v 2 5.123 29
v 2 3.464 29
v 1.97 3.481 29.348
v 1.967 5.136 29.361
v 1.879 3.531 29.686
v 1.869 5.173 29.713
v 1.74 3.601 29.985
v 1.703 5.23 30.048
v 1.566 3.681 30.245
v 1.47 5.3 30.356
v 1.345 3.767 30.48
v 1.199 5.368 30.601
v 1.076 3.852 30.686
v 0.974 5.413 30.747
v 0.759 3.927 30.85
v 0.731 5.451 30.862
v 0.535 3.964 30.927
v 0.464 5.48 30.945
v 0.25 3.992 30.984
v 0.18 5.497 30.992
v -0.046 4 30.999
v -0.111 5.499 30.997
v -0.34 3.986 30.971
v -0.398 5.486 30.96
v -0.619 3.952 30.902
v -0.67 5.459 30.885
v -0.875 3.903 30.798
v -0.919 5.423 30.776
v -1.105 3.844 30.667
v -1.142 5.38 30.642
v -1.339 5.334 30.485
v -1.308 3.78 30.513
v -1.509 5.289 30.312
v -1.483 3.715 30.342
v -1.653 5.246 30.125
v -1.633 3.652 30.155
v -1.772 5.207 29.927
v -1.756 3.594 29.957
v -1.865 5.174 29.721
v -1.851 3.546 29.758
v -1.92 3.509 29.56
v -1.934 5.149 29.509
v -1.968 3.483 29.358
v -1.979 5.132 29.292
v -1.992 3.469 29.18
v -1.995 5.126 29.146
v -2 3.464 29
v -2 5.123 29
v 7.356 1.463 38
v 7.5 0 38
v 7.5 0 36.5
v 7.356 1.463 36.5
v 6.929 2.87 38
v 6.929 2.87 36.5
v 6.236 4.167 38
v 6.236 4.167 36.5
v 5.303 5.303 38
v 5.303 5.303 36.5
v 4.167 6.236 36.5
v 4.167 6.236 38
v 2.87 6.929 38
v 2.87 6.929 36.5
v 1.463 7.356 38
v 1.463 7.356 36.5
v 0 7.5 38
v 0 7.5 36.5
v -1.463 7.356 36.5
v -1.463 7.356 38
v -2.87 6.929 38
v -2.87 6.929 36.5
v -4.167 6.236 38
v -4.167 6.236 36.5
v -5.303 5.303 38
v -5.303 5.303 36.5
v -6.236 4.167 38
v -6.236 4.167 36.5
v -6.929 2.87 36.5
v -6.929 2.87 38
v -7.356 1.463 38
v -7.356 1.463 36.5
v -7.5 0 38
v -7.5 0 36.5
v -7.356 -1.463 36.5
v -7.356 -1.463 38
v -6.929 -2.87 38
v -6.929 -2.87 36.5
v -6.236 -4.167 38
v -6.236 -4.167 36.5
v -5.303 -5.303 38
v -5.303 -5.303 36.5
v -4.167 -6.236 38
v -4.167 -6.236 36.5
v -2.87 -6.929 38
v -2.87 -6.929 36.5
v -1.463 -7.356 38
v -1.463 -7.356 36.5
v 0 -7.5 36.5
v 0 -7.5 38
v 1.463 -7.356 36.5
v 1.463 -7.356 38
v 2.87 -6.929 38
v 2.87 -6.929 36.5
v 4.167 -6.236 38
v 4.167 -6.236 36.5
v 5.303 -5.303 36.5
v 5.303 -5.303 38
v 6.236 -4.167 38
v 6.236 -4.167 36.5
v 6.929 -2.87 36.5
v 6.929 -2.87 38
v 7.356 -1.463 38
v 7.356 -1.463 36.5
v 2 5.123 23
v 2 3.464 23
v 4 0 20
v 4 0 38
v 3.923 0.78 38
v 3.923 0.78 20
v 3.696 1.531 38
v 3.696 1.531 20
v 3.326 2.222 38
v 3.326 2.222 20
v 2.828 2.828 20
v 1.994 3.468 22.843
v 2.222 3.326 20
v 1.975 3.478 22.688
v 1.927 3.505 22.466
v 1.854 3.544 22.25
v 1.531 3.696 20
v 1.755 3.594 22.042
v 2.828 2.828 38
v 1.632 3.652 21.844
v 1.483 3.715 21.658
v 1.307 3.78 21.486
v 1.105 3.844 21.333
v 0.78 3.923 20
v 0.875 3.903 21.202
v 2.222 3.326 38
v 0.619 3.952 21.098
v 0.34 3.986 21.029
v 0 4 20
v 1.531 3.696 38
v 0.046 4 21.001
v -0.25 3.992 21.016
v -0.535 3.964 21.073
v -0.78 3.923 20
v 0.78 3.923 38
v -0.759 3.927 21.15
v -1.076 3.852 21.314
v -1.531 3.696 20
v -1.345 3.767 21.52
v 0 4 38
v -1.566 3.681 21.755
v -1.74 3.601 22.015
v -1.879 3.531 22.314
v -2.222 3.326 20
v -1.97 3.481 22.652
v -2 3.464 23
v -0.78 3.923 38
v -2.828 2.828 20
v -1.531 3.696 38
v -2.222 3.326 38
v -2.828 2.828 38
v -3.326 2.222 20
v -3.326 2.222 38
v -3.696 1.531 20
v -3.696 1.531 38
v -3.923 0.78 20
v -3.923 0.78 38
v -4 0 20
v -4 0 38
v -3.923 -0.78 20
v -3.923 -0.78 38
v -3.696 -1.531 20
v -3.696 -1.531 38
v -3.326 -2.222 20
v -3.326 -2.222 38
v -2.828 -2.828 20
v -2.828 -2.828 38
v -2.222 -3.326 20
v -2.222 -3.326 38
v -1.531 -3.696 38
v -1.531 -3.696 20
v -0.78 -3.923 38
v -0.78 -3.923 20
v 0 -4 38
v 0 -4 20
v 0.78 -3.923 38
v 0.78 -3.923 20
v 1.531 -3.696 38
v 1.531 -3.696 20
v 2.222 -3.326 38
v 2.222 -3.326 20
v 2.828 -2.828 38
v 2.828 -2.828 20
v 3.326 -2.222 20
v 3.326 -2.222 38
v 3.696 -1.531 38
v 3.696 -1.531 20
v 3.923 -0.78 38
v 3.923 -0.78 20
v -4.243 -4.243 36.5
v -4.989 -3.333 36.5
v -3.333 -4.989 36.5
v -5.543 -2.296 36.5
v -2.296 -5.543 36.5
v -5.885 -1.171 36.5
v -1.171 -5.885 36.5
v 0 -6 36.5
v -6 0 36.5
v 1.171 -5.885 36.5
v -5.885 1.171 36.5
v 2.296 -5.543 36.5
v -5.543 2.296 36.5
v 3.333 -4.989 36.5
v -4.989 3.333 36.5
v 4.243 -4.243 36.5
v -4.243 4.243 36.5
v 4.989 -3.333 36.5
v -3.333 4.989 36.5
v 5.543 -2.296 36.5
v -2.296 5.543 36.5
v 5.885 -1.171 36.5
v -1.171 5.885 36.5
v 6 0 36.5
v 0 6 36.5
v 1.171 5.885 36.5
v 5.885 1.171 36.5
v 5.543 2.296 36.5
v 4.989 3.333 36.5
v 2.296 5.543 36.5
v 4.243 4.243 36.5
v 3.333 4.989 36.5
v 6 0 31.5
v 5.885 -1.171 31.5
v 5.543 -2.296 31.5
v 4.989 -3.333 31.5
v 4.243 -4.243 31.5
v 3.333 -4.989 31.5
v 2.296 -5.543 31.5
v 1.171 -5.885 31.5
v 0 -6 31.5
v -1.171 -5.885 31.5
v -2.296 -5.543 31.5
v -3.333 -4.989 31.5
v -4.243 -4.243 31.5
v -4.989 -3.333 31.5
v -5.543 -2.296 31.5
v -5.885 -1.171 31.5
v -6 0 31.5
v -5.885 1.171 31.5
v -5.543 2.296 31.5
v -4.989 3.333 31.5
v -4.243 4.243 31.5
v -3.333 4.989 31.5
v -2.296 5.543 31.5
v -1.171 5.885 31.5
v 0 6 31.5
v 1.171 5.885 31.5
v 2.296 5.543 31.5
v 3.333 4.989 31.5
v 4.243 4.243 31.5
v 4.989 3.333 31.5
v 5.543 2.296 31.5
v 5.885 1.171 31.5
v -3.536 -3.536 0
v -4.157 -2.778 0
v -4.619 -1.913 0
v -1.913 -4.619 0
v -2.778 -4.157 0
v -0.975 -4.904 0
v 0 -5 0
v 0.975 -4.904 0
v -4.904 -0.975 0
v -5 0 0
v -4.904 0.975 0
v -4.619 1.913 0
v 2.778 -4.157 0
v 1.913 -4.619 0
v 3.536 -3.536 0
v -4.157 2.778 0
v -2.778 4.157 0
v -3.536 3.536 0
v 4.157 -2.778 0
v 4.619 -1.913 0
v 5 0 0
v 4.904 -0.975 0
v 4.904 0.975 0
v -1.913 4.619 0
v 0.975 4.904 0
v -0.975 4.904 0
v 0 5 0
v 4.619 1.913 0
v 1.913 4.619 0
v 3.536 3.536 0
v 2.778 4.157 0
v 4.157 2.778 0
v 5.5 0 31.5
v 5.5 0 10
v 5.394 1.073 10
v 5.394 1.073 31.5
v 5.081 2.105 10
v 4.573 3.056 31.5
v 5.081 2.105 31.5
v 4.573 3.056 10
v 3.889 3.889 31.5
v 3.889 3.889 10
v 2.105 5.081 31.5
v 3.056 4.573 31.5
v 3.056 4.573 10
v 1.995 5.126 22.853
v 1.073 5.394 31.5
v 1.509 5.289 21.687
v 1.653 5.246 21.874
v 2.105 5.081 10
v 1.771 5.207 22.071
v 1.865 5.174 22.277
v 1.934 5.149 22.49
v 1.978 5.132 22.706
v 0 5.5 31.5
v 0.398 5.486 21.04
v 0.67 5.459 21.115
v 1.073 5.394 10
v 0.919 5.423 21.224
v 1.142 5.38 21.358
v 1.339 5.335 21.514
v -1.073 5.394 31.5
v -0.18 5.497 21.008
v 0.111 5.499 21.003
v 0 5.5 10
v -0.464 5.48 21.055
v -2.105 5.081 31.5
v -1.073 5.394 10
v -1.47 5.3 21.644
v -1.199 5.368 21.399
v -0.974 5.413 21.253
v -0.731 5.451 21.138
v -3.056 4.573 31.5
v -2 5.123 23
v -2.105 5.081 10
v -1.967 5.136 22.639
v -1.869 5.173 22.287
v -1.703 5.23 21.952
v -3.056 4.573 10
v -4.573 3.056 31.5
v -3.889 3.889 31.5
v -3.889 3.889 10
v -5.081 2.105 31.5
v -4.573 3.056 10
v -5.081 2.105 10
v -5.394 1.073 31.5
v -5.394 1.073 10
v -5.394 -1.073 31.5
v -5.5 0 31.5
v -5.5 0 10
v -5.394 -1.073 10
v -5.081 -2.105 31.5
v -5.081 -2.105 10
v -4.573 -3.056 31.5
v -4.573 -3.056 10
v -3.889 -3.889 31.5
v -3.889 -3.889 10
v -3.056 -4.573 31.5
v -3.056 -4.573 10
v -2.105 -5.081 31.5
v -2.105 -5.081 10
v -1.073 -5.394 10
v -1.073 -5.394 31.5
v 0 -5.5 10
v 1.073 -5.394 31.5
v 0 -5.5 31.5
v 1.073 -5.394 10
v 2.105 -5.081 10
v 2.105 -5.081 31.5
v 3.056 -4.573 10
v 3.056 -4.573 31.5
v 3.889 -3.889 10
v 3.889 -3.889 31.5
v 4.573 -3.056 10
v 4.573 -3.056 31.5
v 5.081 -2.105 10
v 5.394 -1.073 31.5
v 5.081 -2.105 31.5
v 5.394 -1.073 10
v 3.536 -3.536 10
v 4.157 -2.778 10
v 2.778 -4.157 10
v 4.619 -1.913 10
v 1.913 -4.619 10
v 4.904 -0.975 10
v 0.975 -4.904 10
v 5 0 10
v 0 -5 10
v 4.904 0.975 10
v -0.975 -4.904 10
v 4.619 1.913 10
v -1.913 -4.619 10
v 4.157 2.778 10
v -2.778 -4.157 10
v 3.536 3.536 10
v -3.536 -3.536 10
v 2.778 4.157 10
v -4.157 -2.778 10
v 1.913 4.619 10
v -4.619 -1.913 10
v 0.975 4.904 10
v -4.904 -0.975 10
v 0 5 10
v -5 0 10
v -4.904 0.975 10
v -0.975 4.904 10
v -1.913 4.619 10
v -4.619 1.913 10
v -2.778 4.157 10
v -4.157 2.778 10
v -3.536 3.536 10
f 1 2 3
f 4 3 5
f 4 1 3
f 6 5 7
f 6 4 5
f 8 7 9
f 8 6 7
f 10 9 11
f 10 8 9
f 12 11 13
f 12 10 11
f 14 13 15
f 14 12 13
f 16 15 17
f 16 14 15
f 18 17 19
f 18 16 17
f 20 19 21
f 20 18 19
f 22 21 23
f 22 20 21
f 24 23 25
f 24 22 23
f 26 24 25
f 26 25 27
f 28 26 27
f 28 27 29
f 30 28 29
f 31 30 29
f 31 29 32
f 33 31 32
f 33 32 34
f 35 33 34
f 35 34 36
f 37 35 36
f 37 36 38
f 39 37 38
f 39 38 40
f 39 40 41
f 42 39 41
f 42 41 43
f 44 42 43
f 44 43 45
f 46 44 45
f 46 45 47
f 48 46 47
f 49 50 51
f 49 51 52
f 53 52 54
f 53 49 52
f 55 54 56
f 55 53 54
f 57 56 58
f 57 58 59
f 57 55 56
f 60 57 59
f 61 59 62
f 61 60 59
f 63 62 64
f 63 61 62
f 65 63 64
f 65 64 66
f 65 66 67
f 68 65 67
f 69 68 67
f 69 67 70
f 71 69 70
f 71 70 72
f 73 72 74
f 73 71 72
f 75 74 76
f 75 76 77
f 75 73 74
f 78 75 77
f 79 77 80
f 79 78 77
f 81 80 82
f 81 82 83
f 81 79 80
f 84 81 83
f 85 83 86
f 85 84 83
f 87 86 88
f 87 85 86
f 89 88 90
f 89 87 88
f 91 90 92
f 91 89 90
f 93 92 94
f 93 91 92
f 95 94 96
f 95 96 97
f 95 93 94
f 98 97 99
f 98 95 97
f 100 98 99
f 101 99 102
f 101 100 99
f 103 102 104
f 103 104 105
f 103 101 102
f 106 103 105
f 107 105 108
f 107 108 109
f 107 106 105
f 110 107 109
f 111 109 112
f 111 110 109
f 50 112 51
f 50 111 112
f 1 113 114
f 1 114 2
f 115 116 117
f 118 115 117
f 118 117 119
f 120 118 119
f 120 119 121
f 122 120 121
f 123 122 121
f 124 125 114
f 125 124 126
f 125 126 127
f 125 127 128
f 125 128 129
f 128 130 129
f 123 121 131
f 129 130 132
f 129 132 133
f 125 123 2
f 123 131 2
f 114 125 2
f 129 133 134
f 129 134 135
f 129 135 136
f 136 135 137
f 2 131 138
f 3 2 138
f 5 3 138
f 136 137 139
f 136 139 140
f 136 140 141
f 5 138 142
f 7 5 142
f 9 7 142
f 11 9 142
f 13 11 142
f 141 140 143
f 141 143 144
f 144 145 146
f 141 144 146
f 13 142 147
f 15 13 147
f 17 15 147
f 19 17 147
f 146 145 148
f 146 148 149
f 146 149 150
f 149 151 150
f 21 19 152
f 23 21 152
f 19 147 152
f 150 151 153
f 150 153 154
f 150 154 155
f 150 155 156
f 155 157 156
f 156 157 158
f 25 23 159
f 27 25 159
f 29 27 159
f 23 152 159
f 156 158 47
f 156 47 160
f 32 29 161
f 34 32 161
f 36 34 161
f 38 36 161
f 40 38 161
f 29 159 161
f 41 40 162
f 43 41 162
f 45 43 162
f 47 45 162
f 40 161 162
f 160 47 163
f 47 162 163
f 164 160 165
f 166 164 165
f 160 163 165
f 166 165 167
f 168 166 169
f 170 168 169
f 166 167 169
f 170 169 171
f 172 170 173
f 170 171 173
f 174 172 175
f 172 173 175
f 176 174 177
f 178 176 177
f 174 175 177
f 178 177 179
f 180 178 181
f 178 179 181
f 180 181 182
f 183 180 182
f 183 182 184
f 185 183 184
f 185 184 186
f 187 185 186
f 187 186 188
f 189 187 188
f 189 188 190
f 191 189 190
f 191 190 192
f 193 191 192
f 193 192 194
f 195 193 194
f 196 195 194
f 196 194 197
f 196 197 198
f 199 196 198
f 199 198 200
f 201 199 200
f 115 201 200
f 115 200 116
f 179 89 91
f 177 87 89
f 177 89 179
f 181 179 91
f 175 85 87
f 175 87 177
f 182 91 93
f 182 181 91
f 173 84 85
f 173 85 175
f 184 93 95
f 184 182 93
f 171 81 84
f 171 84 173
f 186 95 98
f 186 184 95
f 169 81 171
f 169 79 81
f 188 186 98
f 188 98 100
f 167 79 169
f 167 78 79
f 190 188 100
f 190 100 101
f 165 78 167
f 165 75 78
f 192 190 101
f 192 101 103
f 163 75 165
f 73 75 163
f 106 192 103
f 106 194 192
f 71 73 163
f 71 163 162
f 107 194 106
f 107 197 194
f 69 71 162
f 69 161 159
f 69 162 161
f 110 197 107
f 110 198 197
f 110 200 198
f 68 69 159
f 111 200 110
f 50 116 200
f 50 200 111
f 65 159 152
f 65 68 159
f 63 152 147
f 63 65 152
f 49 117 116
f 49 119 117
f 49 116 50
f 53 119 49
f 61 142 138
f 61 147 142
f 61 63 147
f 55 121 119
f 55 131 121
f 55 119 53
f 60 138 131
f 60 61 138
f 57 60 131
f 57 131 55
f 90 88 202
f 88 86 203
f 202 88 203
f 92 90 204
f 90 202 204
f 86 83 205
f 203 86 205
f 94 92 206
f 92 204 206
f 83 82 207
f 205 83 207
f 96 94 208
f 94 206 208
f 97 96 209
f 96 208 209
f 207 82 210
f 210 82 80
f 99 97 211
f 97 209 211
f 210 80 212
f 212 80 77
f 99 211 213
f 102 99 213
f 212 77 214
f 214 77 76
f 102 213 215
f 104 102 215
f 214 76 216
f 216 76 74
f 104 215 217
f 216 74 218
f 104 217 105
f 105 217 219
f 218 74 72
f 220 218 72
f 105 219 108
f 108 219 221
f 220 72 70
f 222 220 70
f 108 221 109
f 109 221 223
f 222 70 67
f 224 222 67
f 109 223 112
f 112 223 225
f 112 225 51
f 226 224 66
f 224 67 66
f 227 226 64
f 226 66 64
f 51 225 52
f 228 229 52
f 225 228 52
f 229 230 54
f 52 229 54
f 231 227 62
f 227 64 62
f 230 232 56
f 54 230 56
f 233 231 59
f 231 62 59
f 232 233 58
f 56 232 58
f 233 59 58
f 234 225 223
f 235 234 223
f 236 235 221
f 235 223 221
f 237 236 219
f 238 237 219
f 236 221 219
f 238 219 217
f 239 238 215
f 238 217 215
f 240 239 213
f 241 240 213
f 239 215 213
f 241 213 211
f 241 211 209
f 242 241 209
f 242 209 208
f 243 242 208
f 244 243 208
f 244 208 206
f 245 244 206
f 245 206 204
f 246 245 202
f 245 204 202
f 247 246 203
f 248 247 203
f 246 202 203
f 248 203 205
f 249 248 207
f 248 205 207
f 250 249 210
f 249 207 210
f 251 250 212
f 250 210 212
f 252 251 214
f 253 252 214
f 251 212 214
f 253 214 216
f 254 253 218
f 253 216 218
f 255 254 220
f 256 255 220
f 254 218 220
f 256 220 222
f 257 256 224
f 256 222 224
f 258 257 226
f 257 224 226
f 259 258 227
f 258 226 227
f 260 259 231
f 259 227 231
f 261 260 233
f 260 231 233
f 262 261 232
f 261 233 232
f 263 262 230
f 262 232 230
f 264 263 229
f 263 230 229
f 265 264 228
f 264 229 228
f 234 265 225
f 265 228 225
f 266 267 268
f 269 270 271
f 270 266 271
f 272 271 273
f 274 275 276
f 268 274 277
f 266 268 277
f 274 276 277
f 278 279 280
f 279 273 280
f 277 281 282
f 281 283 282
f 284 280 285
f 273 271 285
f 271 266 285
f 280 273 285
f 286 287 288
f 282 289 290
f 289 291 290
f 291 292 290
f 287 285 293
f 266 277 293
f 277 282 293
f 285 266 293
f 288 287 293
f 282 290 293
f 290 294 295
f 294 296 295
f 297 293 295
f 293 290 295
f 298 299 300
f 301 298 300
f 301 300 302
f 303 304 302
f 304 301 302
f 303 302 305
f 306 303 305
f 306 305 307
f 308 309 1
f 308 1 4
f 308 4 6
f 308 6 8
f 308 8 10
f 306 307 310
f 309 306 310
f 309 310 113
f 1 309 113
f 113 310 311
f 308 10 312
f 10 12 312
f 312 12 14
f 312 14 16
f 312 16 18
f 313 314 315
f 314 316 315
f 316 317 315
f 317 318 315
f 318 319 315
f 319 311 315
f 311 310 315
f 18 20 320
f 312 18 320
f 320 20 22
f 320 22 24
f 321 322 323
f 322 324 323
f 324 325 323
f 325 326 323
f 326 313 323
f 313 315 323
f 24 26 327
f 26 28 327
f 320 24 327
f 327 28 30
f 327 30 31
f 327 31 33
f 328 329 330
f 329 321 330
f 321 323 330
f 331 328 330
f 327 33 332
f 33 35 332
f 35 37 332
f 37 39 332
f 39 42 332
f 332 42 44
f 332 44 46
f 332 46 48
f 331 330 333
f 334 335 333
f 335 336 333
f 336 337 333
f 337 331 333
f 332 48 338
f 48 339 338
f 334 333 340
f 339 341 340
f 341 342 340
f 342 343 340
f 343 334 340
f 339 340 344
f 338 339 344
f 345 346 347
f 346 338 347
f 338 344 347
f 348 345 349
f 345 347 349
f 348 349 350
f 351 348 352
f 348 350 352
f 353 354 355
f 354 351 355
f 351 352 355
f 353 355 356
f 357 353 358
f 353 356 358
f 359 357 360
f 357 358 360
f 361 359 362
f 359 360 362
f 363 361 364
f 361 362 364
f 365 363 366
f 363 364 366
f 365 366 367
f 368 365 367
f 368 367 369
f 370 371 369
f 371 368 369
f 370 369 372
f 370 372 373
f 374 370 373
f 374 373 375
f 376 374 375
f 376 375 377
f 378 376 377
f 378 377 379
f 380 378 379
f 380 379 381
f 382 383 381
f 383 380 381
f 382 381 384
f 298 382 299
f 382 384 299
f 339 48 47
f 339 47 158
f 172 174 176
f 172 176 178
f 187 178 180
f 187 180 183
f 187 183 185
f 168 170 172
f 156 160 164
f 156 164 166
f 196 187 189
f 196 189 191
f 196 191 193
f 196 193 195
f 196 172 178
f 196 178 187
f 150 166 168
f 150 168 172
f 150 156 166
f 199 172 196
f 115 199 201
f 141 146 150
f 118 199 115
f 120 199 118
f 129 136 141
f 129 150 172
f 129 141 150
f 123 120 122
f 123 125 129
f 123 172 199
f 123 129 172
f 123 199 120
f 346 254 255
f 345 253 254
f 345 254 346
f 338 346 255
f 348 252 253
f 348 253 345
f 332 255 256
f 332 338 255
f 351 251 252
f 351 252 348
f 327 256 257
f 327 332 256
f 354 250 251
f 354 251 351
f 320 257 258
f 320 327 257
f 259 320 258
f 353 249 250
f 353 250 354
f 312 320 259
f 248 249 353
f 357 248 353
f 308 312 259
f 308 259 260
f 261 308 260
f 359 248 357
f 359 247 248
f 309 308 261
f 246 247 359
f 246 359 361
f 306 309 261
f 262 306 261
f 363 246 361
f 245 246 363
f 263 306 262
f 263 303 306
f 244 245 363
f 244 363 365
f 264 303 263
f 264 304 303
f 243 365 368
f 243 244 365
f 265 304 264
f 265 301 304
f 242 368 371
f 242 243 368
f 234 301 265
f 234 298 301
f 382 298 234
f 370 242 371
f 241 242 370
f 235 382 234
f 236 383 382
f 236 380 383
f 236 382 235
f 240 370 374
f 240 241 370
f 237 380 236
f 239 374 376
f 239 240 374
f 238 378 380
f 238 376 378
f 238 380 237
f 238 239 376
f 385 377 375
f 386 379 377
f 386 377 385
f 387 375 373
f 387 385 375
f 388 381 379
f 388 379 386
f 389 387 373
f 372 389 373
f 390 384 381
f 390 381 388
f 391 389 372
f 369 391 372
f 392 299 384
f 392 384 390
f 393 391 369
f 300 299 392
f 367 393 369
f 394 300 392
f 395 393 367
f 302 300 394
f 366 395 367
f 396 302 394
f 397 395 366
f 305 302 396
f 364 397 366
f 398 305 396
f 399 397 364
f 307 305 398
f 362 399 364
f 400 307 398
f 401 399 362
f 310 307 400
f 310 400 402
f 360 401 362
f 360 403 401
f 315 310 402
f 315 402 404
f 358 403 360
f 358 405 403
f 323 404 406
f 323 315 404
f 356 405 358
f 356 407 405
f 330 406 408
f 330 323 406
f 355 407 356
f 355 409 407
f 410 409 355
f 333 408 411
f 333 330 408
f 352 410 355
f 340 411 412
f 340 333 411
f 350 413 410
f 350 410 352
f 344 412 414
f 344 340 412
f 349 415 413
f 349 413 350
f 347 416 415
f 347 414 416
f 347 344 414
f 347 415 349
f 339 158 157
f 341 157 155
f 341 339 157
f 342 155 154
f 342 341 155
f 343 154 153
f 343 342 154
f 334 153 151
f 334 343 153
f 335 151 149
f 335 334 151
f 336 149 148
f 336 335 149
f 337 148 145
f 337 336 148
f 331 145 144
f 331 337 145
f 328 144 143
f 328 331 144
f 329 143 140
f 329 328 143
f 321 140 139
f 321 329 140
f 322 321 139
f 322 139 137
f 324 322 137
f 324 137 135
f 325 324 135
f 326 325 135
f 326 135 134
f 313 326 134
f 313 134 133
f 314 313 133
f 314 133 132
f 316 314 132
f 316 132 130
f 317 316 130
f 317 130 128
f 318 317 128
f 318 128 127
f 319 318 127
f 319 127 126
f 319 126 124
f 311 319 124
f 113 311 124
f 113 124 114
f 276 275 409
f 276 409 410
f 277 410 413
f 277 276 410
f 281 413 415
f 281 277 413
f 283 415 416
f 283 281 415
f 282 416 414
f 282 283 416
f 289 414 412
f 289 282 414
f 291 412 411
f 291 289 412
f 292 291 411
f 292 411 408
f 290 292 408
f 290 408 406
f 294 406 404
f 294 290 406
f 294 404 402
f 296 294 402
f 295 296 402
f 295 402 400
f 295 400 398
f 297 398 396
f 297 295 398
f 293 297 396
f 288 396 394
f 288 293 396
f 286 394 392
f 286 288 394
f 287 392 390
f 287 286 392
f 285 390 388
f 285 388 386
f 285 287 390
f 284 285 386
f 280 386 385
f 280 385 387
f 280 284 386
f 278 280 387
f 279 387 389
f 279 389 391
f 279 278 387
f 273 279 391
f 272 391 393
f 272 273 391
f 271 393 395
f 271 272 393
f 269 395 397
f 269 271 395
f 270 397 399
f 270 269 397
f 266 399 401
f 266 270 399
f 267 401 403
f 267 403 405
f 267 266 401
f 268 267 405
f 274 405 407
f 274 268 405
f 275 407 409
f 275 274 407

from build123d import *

# Parameters (mm, degrees)
SKETCH1_R                    = 5.5
BOSS_EXTRUDE1_DEPTH          = 38
SKETCH8_R                    = 7.5
BOSS_EXTRUDE2_DEPTH          = 1.5
SKETCH9_R                    = 6
BOSS_EXTRUDE3_DEPTH          = 5
SKETCH2_R                    = 4
CUT_EXTRUDE1_DEPTH           = 18
KEYWAY_SLOT_DEPTH            = 2.5
SKETCH11_OUTSIDE_W           = 25.704
SKETCH11_OUTSIDE_H           = 25.704
SKETCH11_OUTSIDE_R           = 5
TRIM_FOR_M10_WHEEL_NUT_DEPTH = 10


with BuildPart() as part:
    # Sketch1 → Boss-Extrude1 (new body)
    with BuildSketch(Plane.XY):
        Circle(SKETCH1_R)
    extrude(amount=BOSS_EXTRUDE1_DEPTH)

    # Sketch8 → Boss-Extrude2 (add)
    with BuildSketch(Plane.XY.offset(38)):
        Circle(SKETCH8_R)
    extrude(amount=-BOSS_EXTRUDE2_DEPTH)

    # Sketch9 → Boss-Extrude3 (add)
    with BuildSketch(Plane(origin=(0, 0, 36.5), x_dir=(-1, 0, 0), z_dir=(0, 0, -1))):
        with Locations(Location((0, 0, 0), (0, 0, 180))):
            Circle(SKETCH9_R)
    extrude(amount=BOSS_EXTRUDE3_DEPTH)

    # Sketch2 → Cut-Extrude1 (cut)
    with BuildSketch(Plane.XY.offset(38)):
        Circle(SKETCH2_R)
    extrude(amount=-CUT_EXTRUDE1_DEPTH, mode=Mode.SUBTRACT)

    # Sketch7 → Keyway slot (cut)
    with BuildSketch(Plane(origin=(0, 5.5, 0), x_dir=(1, 0, 0), z_dir=(0, 1, 0))):
        with BuildLine():
            Line((-2, -29), (-2, -23))
            ThreePointArc((-2, -23), (0, -21), (2, -23))
            Line((2, -23), (2, -29))
            ThreePointArc((2, -29), (0, -31), (-2, -29))
        make_face()
    extrude(amount=-KEYWAY_SLOT_DEPTH, mode=Mode.SUBTRACT)

    # Sketch11 outside → Trim for M10 wheel nut (cut)
    with BuildSketch(Plane(origin=(0, 0, 0), x_dir=(-1, 0, 0), z_dir=(0, 0, -1))):
        Rectangle(SKETCH11_OUTSIDE_W, SKETCH11_OUTSIDE_H)
        Circle(SKETCH11_OUTSIDE_R, mode=Mode.SUBTRACT)
    extrude(amount=-TRIM_FOR_M10_WHEEL_NUT_DEPTH, mode=Mode.SUBTRACT)


solid = part.part
